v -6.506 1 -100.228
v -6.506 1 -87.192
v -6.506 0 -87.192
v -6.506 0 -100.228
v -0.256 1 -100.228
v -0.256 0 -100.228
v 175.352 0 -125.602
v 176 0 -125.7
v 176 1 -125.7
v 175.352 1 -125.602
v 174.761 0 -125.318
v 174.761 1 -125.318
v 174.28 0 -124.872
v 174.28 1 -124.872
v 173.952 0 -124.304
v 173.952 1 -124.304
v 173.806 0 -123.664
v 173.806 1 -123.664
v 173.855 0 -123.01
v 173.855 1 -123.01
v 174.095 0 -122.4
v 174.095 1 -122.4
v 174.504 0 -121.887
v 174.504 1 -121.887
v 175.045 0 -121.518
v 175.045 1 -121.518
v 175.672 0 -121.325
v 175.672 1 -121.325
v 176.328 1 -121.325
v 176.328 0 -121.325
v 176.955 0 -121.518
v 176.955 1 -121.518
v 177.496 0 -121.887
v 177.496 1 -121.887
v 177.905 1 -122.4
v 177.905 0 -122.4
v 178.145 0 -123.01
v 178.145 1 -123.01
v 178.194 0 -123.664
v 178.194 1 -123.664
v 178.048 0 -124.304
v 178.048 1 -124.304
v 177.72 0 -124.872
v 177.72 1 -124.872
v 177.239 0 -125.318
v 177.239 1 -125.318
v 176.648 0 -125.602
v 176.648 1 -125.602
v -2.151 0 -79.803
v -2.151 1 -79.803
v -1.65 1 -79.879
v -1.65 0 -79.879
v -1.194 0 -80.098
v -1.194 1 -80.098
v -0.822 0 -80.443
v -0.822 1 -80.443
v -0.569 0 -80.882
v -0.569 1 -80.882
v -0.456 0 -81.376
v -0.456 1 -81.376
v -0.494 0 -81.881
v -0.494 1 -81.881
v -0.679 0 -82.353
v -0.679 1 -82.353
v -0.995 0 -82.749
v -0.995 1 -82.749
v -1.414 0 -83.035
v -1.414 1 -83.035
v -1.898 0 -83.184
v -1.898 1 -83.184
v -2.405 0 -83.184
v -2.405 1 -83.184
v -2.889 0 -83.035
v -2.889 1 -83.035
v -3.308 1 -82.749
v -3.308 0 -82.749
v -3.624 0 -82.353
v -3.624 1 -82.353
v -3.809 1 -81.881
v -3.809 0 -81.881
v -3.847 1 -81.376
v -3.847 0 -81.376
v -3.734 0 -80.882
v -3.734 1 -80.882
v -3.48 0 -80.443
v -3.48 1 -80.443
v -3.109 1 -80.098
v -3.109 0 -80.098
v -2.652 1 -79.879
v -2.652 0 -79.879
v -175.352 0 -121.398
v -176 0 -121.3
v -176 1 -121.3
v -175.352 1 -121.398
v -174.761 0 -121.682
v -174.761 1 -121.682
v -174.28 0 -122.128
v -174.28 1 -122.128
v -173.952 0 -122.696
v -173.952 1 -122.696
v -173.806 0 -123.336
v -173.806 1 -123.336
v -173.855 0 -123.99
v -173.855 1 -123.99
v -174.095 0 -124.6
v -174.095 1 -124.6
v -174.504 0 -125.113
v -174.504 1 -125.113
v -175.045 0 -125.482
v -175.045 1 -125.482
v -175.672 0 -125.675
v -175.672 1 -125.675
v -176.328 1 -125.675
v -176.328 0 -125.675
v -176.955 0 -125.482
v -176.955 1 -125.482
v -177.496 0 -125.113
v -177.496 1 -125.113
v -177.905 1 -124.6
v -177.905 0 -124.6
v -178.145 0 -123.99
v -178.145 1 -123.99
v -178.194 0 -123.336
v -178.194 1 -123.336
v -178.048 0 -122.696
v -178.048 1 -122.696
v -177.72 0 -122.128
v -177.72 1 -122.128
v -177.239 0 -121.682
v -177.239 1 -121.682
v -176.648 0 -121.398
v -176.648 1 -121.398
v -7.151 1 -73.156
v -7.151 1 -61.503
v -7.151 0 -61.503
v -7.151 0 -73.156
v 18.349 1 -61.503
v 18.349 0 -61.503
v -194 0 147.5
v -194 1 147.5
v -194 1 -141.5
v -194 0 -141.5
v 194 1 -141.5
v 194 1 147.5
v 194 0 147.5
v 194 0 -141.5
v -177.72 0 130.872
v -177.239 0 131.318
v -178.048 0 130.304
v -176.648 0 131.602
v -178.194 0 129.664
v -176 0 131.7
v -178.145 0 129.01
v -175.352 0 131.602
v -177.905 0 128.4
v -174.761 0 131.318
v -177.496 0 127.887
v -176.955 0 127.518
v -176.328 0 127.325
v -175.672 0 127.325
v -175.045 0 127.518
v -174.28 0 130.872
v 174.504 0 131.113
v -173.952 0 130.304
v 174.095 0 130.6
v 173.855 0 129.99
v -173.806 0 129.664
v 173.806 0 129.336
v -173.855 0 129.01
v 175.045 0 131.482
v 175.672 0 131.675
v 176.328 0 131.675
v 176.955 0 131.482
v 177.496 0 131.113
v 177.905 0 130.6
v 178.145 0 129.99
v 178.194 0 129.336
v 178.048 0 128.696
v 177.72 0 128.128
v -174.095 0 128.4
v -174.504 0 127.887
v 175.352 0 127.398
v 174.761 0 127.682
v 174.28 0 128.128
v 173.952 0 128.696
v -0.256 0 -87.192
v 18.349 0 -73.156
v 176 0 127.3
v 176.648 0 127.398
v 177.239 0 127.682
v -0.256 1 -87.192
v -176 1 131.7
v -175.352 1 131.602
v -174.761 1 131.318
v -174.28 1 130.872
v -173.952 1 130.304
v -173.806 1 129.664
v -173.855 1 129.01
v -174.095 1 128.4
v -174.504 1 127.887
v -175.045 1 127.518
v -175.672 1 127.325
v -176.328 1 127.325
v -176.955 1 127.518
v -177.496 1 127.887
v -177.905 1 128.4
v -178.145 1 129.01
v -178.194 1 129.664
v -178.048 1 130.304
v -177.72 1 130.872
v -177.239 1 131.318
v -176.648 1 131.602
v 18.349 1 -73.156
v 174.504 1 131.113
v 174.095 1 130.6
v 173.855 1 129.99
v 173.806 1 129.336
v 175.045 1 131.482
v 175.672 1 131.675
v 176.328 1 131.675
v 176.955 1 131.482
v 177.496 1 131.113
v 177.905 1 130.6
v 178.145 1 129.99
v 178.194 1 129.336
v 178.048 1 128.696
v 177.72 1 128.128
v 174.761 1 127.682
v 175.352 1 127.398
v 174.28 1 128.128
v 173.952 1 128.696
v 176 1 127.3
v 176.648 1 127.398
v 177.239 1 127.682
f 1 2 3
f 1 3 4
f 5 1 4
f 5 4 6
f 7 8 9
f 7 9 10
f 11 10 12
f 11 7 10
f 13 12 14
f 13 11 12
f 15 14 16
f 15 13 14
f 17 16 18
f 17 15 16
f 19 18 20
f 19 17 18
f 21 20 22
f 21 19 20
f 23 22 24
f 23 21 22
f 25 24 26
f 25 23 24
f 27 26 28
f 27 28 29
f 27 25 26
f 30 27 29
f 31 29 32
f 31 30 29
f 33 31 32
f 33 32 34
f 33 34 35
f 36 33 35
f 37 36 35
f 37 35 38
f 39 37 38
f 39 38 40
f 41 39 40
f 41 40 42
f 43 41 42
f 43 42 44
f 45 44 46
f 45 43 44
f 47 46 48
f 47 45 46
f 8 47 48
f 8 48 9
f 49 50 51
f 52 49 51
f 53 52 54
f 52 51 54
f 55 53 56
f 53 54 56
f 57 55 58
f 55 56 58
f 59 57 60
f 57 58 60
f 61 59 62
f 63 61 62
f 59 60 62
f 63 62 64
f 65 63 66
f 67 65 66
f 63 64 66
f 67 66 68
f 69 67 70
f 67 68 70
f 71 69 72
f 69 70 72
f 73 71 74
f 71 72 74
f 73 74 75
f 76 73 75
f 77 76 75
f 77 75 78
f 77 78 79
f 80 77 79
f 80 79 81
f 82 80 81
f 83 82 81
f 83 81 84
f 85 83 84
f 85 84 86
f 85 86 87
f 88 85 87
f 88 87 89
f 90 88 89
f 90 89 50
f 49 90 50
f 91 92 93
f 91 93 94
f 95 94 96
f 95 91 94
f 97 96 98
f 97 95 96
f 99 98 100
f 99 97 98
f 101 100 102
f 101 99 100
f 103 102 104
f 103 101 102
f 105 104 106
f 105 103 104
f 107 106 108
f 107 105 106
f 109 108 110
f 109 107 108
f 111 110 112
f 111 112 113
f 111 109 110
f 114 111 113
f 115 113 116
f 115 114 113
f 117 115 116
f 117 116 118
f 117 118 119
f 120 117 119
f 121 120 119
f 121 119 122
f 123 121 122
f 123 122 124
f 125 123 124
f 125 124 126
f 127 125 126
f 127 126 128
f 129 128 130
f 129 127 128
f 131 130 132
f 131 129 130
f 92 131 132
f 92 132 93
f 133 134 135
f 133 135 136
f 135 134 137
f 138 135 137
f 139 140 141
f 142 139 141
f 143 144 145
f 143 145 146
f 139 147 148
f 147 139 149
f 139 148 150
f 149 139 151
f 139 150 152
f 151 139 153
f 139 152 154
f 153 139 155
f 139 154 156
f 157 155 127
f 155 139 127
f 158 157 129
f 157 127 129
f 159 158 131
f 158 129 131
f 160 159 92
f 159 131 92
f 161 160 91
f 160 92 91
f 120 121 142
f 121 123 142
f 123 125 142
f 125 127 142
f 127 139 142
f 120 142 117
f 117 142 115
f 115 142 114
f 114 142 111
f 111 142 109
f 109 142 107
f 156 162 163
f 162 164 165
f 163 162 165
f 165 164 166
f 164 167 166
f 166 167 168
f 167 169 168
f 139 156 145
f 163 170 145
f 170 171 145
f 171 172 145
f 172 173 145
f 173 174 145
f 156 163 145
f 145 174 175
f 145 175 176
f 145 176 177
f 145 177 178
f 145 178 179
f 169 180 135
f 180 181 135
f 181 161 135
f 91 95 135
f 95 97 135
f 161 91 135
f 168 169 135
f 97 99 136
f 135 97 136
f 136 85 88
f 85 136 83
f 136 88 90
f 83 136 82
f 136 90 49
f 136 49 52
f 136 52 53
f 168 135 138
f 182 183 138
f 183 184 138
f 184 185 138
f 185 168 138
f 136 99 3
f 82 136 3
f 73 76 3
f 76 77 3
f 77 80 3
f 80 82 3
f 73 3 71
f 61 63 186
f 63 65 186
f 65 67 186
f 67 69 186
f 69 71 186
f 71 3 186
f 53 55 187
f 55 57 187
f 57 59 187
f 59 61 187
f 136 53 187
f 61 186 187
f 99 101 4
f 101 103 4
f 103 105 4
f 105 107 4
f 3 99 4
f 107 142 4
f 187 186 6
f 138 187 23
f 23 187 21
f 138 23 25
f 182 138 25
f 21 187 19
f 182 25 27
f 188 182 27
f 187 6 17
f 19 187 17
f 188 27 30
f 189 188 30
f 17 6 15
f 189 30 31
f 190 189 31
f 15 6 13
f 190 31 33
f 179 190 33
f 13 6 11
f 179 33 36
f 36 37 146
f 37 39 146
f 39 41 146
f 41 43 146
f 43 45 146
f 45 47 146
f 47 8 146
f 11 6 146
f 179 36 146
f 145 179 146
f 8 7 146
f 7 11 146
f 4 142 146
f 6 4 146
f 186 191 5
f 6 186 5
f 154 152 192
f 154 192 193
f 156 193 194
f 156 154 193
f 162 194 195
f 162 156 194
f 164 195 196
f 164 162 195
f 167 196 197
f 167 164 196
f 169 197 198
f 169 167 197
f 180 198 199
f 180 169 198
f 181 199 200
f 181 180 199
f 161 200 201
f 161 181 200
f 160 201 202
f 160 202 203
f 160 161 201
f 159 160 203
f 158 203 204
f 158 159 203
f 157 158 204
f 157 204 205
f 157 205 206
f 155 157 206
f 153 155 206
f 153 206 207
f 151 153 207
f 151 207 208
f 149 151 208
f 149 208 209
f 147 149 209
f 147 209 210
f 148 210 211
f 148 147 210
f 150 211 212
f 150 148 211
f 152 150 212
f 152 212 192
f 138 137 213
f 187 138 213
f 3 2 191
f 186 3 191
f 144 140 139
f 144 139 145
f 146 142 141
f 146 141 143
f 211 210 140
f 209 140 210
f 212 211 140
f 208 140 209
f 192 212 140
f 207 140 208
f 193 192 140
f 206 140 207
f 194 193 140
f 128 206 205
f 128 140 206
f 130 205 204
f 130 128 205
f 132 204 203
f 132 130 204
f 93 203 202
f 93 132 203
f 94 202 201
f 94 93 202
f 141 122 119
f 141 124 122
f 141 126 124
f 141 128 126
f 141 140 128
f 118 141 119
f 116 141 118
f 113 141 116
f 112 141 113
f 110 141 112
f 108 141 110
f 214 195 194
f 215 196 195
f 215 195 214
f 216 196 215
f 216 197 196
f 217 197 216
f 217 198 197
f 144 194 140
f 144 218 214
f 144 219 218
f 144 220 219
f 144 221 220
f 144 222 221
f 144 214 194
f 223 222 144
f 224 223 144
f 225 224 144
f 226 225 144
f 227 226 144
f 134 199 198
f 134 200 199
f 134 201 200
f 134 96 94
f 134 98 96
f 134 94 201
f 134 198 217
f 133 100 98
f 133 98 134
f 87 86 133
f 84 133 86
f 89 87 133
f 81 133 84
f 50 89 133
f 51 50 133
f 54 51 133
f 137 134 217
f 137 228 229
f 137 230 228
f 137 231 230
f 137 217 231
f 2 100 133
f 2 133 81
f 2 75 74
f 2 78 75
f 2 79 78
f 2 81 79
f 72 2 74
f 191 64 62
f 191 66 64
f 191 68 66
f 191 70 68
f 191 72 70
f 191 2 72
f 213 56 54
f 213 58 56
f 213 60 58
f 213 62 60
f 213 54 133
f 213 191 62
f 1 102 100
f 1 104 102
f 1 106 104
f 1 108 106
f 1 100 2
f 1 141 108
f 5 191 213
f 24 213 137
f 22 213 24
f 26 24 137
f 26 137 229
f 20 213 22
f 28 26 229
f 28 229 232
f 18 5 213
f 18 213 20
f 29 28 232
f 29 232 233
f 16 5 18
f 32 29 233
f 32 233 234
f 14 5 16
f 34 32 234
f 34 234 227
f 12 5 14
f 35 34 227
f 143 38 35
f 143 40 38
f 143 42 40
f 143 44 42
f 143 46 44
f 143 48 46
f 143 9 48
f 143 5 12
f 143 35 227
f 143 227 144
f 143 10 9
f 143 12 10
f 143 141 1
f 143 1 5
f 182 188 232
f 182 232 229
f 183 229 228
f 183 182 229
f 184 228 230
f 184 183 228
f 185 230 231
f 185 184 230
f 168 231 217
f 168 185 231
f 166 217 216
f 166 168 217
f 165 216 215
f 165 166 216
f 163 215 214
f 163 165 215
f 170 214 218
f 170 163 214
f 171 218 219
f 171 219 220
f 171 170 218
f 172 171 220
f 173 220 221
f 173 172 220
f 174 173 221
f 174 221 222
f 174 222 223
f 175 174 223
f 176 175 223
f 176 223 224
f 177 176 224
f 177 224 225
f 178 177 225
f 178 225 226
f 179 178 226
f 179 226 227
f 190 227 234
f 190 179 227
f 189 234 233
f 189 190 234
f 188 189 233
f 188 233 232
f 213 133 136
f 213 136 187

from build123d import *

# Parameters (mm, degrees)
SKETCH1_W           = 388
SKETCH1_H           = 283
SKETCH1_R           = 2.2
BOSS_EXTRUDE1_DEPTH = 1
SKETCH3_W           = 388
SKETCH3_H           = 6
BOSS_EXTRUDE2_DEPTH = 1
CUT_EXTRUDE1_REACH  = 245.707
SKETCH2_R           = 1.7
SKETCH2_W           = 6.249732698
SKETCH2_H           = 13.035291303
SKETCH2_W_2         = 25.5
SKETCH2_H_2         = 11.652706254


with BuildPart() as part:
    # Sketch1 → Boss-Extrude1 (new body)
    with BuildSketch(Plane(origin=(0, 0, 0), x_dir=(1, 0, 0), z_dir=(0, 1, 0))):
        Rectangle(SKETCH1_W, SKETCH1_H)
        with Locations(Location((-176, -129.5, 0), (0, 0, 270))):
            Circle(SKETCH1_R, mode=Mode.SUBTRACT)
        with Locations(Location((-176, 123.5, 0), (0, 0, 270))):
            Circle(SKETCH1_R, mode=Mode.SUBTRACT)
        with Locations(Location((176, 123.5, 0), (0, 0, 90))):
            Circle(SKETCH1_R, mode=Mode.SUBTRACT)
        with Locations(Location((176, -129.5, 0), (0, 0, 90))):
            Circle(SKETCH1_R, mode=Mode.SUBTRACT)
    extrude(amount=BOSS_EXTRUDE1_DEPTH)

    # Sketch3 → Boss-Extrude2 (add)
    with BuildSketch(Plane(origin=(0, 1, 0), x_dir=(1, 0, 0), z_dir=(0, 1, 0))):
        with Locations((0, -144.5)):
            Rectangle(SKETCH3_W, SKETCH3_H)
    extrude(amount=-BOSS_EXTRUDE2_DEPTH)

    # Sketch2 → Cut-Extrude1 (cut, up to next)
    with BuildSketch(Plane(origin=(0, 1, 0), x_dir=(1, 0, 0), z_dir=(0, 1, 0)), mode=Mode.PRIVATE) as cut_extrude1_sk1:
        with Locations(Location((-2.151296326, 81.503031076, 0), (0, 0, 270))):
            Circle(SKETCH2_R)
    cut_extrude1_tool1 = extrude(cut_extrude1_sk1.sketch, amount=-CUT_EXTRUDE1_REACH, mode=Mode.PRIVATE) & part.part
    # Sketch2 → Cut-Extrude1 (cut, up to next)
    with BuildSketch(Plane(origin=(0, 1, 0), x_dir=(1, 0, 0), z_dir=(0, 1, 0)), mode=Mode.PRIVATE) as cut_extrude1_sk2:
        with Locations((-3.381291093, 93.709879219)):
            Rectangle(SKETCH2_W, SKETCH2_H)
    cut_extrude1_tool2 = extrude(cut_extrude1_sk2.sketch, amount=-CUT_EXTRUDE1_REACH, mode=Mode.PRIVATE) & part.part
    # Sketch2 → Cut-Extrude1 (cut, up to next)
    with BuildSketch(Plane(origin=(0, 1, 0), x_dir=(1, 0, 0), z_dir=(0, 1, 0)), mode=Mode.PRIVATE) as cut_extrude1_sk3:
        with Locations((5.598703674, 67.329384203)):
            Rectangle(SKETCH2_W_2, SKETCH2_H_2)
    cut_extrude1_tool3 = extrude(cut_extrude1_sk3.sketch, amount=-CUT_EXTRUDE1_REACH, mode=Mode.PRIVATE) & part.part
    add(cut_extrude1_tool1.solids().sort_by_distance((-2.151296, 1, -81.503031))[0], mode=Mode.SUBTRACT)
    add(cut_extrude1_tool2.solids().sort_by_distance((-3.381291, 1, -93.709879))[0], mode=Mode.SUBTRACT)
    add(cut_extrude1_tool3.solids().sort_by_distance((5.598704, 1, -67.329384))[0], mode=Mode.SUBTRACT)


solid = part.part
